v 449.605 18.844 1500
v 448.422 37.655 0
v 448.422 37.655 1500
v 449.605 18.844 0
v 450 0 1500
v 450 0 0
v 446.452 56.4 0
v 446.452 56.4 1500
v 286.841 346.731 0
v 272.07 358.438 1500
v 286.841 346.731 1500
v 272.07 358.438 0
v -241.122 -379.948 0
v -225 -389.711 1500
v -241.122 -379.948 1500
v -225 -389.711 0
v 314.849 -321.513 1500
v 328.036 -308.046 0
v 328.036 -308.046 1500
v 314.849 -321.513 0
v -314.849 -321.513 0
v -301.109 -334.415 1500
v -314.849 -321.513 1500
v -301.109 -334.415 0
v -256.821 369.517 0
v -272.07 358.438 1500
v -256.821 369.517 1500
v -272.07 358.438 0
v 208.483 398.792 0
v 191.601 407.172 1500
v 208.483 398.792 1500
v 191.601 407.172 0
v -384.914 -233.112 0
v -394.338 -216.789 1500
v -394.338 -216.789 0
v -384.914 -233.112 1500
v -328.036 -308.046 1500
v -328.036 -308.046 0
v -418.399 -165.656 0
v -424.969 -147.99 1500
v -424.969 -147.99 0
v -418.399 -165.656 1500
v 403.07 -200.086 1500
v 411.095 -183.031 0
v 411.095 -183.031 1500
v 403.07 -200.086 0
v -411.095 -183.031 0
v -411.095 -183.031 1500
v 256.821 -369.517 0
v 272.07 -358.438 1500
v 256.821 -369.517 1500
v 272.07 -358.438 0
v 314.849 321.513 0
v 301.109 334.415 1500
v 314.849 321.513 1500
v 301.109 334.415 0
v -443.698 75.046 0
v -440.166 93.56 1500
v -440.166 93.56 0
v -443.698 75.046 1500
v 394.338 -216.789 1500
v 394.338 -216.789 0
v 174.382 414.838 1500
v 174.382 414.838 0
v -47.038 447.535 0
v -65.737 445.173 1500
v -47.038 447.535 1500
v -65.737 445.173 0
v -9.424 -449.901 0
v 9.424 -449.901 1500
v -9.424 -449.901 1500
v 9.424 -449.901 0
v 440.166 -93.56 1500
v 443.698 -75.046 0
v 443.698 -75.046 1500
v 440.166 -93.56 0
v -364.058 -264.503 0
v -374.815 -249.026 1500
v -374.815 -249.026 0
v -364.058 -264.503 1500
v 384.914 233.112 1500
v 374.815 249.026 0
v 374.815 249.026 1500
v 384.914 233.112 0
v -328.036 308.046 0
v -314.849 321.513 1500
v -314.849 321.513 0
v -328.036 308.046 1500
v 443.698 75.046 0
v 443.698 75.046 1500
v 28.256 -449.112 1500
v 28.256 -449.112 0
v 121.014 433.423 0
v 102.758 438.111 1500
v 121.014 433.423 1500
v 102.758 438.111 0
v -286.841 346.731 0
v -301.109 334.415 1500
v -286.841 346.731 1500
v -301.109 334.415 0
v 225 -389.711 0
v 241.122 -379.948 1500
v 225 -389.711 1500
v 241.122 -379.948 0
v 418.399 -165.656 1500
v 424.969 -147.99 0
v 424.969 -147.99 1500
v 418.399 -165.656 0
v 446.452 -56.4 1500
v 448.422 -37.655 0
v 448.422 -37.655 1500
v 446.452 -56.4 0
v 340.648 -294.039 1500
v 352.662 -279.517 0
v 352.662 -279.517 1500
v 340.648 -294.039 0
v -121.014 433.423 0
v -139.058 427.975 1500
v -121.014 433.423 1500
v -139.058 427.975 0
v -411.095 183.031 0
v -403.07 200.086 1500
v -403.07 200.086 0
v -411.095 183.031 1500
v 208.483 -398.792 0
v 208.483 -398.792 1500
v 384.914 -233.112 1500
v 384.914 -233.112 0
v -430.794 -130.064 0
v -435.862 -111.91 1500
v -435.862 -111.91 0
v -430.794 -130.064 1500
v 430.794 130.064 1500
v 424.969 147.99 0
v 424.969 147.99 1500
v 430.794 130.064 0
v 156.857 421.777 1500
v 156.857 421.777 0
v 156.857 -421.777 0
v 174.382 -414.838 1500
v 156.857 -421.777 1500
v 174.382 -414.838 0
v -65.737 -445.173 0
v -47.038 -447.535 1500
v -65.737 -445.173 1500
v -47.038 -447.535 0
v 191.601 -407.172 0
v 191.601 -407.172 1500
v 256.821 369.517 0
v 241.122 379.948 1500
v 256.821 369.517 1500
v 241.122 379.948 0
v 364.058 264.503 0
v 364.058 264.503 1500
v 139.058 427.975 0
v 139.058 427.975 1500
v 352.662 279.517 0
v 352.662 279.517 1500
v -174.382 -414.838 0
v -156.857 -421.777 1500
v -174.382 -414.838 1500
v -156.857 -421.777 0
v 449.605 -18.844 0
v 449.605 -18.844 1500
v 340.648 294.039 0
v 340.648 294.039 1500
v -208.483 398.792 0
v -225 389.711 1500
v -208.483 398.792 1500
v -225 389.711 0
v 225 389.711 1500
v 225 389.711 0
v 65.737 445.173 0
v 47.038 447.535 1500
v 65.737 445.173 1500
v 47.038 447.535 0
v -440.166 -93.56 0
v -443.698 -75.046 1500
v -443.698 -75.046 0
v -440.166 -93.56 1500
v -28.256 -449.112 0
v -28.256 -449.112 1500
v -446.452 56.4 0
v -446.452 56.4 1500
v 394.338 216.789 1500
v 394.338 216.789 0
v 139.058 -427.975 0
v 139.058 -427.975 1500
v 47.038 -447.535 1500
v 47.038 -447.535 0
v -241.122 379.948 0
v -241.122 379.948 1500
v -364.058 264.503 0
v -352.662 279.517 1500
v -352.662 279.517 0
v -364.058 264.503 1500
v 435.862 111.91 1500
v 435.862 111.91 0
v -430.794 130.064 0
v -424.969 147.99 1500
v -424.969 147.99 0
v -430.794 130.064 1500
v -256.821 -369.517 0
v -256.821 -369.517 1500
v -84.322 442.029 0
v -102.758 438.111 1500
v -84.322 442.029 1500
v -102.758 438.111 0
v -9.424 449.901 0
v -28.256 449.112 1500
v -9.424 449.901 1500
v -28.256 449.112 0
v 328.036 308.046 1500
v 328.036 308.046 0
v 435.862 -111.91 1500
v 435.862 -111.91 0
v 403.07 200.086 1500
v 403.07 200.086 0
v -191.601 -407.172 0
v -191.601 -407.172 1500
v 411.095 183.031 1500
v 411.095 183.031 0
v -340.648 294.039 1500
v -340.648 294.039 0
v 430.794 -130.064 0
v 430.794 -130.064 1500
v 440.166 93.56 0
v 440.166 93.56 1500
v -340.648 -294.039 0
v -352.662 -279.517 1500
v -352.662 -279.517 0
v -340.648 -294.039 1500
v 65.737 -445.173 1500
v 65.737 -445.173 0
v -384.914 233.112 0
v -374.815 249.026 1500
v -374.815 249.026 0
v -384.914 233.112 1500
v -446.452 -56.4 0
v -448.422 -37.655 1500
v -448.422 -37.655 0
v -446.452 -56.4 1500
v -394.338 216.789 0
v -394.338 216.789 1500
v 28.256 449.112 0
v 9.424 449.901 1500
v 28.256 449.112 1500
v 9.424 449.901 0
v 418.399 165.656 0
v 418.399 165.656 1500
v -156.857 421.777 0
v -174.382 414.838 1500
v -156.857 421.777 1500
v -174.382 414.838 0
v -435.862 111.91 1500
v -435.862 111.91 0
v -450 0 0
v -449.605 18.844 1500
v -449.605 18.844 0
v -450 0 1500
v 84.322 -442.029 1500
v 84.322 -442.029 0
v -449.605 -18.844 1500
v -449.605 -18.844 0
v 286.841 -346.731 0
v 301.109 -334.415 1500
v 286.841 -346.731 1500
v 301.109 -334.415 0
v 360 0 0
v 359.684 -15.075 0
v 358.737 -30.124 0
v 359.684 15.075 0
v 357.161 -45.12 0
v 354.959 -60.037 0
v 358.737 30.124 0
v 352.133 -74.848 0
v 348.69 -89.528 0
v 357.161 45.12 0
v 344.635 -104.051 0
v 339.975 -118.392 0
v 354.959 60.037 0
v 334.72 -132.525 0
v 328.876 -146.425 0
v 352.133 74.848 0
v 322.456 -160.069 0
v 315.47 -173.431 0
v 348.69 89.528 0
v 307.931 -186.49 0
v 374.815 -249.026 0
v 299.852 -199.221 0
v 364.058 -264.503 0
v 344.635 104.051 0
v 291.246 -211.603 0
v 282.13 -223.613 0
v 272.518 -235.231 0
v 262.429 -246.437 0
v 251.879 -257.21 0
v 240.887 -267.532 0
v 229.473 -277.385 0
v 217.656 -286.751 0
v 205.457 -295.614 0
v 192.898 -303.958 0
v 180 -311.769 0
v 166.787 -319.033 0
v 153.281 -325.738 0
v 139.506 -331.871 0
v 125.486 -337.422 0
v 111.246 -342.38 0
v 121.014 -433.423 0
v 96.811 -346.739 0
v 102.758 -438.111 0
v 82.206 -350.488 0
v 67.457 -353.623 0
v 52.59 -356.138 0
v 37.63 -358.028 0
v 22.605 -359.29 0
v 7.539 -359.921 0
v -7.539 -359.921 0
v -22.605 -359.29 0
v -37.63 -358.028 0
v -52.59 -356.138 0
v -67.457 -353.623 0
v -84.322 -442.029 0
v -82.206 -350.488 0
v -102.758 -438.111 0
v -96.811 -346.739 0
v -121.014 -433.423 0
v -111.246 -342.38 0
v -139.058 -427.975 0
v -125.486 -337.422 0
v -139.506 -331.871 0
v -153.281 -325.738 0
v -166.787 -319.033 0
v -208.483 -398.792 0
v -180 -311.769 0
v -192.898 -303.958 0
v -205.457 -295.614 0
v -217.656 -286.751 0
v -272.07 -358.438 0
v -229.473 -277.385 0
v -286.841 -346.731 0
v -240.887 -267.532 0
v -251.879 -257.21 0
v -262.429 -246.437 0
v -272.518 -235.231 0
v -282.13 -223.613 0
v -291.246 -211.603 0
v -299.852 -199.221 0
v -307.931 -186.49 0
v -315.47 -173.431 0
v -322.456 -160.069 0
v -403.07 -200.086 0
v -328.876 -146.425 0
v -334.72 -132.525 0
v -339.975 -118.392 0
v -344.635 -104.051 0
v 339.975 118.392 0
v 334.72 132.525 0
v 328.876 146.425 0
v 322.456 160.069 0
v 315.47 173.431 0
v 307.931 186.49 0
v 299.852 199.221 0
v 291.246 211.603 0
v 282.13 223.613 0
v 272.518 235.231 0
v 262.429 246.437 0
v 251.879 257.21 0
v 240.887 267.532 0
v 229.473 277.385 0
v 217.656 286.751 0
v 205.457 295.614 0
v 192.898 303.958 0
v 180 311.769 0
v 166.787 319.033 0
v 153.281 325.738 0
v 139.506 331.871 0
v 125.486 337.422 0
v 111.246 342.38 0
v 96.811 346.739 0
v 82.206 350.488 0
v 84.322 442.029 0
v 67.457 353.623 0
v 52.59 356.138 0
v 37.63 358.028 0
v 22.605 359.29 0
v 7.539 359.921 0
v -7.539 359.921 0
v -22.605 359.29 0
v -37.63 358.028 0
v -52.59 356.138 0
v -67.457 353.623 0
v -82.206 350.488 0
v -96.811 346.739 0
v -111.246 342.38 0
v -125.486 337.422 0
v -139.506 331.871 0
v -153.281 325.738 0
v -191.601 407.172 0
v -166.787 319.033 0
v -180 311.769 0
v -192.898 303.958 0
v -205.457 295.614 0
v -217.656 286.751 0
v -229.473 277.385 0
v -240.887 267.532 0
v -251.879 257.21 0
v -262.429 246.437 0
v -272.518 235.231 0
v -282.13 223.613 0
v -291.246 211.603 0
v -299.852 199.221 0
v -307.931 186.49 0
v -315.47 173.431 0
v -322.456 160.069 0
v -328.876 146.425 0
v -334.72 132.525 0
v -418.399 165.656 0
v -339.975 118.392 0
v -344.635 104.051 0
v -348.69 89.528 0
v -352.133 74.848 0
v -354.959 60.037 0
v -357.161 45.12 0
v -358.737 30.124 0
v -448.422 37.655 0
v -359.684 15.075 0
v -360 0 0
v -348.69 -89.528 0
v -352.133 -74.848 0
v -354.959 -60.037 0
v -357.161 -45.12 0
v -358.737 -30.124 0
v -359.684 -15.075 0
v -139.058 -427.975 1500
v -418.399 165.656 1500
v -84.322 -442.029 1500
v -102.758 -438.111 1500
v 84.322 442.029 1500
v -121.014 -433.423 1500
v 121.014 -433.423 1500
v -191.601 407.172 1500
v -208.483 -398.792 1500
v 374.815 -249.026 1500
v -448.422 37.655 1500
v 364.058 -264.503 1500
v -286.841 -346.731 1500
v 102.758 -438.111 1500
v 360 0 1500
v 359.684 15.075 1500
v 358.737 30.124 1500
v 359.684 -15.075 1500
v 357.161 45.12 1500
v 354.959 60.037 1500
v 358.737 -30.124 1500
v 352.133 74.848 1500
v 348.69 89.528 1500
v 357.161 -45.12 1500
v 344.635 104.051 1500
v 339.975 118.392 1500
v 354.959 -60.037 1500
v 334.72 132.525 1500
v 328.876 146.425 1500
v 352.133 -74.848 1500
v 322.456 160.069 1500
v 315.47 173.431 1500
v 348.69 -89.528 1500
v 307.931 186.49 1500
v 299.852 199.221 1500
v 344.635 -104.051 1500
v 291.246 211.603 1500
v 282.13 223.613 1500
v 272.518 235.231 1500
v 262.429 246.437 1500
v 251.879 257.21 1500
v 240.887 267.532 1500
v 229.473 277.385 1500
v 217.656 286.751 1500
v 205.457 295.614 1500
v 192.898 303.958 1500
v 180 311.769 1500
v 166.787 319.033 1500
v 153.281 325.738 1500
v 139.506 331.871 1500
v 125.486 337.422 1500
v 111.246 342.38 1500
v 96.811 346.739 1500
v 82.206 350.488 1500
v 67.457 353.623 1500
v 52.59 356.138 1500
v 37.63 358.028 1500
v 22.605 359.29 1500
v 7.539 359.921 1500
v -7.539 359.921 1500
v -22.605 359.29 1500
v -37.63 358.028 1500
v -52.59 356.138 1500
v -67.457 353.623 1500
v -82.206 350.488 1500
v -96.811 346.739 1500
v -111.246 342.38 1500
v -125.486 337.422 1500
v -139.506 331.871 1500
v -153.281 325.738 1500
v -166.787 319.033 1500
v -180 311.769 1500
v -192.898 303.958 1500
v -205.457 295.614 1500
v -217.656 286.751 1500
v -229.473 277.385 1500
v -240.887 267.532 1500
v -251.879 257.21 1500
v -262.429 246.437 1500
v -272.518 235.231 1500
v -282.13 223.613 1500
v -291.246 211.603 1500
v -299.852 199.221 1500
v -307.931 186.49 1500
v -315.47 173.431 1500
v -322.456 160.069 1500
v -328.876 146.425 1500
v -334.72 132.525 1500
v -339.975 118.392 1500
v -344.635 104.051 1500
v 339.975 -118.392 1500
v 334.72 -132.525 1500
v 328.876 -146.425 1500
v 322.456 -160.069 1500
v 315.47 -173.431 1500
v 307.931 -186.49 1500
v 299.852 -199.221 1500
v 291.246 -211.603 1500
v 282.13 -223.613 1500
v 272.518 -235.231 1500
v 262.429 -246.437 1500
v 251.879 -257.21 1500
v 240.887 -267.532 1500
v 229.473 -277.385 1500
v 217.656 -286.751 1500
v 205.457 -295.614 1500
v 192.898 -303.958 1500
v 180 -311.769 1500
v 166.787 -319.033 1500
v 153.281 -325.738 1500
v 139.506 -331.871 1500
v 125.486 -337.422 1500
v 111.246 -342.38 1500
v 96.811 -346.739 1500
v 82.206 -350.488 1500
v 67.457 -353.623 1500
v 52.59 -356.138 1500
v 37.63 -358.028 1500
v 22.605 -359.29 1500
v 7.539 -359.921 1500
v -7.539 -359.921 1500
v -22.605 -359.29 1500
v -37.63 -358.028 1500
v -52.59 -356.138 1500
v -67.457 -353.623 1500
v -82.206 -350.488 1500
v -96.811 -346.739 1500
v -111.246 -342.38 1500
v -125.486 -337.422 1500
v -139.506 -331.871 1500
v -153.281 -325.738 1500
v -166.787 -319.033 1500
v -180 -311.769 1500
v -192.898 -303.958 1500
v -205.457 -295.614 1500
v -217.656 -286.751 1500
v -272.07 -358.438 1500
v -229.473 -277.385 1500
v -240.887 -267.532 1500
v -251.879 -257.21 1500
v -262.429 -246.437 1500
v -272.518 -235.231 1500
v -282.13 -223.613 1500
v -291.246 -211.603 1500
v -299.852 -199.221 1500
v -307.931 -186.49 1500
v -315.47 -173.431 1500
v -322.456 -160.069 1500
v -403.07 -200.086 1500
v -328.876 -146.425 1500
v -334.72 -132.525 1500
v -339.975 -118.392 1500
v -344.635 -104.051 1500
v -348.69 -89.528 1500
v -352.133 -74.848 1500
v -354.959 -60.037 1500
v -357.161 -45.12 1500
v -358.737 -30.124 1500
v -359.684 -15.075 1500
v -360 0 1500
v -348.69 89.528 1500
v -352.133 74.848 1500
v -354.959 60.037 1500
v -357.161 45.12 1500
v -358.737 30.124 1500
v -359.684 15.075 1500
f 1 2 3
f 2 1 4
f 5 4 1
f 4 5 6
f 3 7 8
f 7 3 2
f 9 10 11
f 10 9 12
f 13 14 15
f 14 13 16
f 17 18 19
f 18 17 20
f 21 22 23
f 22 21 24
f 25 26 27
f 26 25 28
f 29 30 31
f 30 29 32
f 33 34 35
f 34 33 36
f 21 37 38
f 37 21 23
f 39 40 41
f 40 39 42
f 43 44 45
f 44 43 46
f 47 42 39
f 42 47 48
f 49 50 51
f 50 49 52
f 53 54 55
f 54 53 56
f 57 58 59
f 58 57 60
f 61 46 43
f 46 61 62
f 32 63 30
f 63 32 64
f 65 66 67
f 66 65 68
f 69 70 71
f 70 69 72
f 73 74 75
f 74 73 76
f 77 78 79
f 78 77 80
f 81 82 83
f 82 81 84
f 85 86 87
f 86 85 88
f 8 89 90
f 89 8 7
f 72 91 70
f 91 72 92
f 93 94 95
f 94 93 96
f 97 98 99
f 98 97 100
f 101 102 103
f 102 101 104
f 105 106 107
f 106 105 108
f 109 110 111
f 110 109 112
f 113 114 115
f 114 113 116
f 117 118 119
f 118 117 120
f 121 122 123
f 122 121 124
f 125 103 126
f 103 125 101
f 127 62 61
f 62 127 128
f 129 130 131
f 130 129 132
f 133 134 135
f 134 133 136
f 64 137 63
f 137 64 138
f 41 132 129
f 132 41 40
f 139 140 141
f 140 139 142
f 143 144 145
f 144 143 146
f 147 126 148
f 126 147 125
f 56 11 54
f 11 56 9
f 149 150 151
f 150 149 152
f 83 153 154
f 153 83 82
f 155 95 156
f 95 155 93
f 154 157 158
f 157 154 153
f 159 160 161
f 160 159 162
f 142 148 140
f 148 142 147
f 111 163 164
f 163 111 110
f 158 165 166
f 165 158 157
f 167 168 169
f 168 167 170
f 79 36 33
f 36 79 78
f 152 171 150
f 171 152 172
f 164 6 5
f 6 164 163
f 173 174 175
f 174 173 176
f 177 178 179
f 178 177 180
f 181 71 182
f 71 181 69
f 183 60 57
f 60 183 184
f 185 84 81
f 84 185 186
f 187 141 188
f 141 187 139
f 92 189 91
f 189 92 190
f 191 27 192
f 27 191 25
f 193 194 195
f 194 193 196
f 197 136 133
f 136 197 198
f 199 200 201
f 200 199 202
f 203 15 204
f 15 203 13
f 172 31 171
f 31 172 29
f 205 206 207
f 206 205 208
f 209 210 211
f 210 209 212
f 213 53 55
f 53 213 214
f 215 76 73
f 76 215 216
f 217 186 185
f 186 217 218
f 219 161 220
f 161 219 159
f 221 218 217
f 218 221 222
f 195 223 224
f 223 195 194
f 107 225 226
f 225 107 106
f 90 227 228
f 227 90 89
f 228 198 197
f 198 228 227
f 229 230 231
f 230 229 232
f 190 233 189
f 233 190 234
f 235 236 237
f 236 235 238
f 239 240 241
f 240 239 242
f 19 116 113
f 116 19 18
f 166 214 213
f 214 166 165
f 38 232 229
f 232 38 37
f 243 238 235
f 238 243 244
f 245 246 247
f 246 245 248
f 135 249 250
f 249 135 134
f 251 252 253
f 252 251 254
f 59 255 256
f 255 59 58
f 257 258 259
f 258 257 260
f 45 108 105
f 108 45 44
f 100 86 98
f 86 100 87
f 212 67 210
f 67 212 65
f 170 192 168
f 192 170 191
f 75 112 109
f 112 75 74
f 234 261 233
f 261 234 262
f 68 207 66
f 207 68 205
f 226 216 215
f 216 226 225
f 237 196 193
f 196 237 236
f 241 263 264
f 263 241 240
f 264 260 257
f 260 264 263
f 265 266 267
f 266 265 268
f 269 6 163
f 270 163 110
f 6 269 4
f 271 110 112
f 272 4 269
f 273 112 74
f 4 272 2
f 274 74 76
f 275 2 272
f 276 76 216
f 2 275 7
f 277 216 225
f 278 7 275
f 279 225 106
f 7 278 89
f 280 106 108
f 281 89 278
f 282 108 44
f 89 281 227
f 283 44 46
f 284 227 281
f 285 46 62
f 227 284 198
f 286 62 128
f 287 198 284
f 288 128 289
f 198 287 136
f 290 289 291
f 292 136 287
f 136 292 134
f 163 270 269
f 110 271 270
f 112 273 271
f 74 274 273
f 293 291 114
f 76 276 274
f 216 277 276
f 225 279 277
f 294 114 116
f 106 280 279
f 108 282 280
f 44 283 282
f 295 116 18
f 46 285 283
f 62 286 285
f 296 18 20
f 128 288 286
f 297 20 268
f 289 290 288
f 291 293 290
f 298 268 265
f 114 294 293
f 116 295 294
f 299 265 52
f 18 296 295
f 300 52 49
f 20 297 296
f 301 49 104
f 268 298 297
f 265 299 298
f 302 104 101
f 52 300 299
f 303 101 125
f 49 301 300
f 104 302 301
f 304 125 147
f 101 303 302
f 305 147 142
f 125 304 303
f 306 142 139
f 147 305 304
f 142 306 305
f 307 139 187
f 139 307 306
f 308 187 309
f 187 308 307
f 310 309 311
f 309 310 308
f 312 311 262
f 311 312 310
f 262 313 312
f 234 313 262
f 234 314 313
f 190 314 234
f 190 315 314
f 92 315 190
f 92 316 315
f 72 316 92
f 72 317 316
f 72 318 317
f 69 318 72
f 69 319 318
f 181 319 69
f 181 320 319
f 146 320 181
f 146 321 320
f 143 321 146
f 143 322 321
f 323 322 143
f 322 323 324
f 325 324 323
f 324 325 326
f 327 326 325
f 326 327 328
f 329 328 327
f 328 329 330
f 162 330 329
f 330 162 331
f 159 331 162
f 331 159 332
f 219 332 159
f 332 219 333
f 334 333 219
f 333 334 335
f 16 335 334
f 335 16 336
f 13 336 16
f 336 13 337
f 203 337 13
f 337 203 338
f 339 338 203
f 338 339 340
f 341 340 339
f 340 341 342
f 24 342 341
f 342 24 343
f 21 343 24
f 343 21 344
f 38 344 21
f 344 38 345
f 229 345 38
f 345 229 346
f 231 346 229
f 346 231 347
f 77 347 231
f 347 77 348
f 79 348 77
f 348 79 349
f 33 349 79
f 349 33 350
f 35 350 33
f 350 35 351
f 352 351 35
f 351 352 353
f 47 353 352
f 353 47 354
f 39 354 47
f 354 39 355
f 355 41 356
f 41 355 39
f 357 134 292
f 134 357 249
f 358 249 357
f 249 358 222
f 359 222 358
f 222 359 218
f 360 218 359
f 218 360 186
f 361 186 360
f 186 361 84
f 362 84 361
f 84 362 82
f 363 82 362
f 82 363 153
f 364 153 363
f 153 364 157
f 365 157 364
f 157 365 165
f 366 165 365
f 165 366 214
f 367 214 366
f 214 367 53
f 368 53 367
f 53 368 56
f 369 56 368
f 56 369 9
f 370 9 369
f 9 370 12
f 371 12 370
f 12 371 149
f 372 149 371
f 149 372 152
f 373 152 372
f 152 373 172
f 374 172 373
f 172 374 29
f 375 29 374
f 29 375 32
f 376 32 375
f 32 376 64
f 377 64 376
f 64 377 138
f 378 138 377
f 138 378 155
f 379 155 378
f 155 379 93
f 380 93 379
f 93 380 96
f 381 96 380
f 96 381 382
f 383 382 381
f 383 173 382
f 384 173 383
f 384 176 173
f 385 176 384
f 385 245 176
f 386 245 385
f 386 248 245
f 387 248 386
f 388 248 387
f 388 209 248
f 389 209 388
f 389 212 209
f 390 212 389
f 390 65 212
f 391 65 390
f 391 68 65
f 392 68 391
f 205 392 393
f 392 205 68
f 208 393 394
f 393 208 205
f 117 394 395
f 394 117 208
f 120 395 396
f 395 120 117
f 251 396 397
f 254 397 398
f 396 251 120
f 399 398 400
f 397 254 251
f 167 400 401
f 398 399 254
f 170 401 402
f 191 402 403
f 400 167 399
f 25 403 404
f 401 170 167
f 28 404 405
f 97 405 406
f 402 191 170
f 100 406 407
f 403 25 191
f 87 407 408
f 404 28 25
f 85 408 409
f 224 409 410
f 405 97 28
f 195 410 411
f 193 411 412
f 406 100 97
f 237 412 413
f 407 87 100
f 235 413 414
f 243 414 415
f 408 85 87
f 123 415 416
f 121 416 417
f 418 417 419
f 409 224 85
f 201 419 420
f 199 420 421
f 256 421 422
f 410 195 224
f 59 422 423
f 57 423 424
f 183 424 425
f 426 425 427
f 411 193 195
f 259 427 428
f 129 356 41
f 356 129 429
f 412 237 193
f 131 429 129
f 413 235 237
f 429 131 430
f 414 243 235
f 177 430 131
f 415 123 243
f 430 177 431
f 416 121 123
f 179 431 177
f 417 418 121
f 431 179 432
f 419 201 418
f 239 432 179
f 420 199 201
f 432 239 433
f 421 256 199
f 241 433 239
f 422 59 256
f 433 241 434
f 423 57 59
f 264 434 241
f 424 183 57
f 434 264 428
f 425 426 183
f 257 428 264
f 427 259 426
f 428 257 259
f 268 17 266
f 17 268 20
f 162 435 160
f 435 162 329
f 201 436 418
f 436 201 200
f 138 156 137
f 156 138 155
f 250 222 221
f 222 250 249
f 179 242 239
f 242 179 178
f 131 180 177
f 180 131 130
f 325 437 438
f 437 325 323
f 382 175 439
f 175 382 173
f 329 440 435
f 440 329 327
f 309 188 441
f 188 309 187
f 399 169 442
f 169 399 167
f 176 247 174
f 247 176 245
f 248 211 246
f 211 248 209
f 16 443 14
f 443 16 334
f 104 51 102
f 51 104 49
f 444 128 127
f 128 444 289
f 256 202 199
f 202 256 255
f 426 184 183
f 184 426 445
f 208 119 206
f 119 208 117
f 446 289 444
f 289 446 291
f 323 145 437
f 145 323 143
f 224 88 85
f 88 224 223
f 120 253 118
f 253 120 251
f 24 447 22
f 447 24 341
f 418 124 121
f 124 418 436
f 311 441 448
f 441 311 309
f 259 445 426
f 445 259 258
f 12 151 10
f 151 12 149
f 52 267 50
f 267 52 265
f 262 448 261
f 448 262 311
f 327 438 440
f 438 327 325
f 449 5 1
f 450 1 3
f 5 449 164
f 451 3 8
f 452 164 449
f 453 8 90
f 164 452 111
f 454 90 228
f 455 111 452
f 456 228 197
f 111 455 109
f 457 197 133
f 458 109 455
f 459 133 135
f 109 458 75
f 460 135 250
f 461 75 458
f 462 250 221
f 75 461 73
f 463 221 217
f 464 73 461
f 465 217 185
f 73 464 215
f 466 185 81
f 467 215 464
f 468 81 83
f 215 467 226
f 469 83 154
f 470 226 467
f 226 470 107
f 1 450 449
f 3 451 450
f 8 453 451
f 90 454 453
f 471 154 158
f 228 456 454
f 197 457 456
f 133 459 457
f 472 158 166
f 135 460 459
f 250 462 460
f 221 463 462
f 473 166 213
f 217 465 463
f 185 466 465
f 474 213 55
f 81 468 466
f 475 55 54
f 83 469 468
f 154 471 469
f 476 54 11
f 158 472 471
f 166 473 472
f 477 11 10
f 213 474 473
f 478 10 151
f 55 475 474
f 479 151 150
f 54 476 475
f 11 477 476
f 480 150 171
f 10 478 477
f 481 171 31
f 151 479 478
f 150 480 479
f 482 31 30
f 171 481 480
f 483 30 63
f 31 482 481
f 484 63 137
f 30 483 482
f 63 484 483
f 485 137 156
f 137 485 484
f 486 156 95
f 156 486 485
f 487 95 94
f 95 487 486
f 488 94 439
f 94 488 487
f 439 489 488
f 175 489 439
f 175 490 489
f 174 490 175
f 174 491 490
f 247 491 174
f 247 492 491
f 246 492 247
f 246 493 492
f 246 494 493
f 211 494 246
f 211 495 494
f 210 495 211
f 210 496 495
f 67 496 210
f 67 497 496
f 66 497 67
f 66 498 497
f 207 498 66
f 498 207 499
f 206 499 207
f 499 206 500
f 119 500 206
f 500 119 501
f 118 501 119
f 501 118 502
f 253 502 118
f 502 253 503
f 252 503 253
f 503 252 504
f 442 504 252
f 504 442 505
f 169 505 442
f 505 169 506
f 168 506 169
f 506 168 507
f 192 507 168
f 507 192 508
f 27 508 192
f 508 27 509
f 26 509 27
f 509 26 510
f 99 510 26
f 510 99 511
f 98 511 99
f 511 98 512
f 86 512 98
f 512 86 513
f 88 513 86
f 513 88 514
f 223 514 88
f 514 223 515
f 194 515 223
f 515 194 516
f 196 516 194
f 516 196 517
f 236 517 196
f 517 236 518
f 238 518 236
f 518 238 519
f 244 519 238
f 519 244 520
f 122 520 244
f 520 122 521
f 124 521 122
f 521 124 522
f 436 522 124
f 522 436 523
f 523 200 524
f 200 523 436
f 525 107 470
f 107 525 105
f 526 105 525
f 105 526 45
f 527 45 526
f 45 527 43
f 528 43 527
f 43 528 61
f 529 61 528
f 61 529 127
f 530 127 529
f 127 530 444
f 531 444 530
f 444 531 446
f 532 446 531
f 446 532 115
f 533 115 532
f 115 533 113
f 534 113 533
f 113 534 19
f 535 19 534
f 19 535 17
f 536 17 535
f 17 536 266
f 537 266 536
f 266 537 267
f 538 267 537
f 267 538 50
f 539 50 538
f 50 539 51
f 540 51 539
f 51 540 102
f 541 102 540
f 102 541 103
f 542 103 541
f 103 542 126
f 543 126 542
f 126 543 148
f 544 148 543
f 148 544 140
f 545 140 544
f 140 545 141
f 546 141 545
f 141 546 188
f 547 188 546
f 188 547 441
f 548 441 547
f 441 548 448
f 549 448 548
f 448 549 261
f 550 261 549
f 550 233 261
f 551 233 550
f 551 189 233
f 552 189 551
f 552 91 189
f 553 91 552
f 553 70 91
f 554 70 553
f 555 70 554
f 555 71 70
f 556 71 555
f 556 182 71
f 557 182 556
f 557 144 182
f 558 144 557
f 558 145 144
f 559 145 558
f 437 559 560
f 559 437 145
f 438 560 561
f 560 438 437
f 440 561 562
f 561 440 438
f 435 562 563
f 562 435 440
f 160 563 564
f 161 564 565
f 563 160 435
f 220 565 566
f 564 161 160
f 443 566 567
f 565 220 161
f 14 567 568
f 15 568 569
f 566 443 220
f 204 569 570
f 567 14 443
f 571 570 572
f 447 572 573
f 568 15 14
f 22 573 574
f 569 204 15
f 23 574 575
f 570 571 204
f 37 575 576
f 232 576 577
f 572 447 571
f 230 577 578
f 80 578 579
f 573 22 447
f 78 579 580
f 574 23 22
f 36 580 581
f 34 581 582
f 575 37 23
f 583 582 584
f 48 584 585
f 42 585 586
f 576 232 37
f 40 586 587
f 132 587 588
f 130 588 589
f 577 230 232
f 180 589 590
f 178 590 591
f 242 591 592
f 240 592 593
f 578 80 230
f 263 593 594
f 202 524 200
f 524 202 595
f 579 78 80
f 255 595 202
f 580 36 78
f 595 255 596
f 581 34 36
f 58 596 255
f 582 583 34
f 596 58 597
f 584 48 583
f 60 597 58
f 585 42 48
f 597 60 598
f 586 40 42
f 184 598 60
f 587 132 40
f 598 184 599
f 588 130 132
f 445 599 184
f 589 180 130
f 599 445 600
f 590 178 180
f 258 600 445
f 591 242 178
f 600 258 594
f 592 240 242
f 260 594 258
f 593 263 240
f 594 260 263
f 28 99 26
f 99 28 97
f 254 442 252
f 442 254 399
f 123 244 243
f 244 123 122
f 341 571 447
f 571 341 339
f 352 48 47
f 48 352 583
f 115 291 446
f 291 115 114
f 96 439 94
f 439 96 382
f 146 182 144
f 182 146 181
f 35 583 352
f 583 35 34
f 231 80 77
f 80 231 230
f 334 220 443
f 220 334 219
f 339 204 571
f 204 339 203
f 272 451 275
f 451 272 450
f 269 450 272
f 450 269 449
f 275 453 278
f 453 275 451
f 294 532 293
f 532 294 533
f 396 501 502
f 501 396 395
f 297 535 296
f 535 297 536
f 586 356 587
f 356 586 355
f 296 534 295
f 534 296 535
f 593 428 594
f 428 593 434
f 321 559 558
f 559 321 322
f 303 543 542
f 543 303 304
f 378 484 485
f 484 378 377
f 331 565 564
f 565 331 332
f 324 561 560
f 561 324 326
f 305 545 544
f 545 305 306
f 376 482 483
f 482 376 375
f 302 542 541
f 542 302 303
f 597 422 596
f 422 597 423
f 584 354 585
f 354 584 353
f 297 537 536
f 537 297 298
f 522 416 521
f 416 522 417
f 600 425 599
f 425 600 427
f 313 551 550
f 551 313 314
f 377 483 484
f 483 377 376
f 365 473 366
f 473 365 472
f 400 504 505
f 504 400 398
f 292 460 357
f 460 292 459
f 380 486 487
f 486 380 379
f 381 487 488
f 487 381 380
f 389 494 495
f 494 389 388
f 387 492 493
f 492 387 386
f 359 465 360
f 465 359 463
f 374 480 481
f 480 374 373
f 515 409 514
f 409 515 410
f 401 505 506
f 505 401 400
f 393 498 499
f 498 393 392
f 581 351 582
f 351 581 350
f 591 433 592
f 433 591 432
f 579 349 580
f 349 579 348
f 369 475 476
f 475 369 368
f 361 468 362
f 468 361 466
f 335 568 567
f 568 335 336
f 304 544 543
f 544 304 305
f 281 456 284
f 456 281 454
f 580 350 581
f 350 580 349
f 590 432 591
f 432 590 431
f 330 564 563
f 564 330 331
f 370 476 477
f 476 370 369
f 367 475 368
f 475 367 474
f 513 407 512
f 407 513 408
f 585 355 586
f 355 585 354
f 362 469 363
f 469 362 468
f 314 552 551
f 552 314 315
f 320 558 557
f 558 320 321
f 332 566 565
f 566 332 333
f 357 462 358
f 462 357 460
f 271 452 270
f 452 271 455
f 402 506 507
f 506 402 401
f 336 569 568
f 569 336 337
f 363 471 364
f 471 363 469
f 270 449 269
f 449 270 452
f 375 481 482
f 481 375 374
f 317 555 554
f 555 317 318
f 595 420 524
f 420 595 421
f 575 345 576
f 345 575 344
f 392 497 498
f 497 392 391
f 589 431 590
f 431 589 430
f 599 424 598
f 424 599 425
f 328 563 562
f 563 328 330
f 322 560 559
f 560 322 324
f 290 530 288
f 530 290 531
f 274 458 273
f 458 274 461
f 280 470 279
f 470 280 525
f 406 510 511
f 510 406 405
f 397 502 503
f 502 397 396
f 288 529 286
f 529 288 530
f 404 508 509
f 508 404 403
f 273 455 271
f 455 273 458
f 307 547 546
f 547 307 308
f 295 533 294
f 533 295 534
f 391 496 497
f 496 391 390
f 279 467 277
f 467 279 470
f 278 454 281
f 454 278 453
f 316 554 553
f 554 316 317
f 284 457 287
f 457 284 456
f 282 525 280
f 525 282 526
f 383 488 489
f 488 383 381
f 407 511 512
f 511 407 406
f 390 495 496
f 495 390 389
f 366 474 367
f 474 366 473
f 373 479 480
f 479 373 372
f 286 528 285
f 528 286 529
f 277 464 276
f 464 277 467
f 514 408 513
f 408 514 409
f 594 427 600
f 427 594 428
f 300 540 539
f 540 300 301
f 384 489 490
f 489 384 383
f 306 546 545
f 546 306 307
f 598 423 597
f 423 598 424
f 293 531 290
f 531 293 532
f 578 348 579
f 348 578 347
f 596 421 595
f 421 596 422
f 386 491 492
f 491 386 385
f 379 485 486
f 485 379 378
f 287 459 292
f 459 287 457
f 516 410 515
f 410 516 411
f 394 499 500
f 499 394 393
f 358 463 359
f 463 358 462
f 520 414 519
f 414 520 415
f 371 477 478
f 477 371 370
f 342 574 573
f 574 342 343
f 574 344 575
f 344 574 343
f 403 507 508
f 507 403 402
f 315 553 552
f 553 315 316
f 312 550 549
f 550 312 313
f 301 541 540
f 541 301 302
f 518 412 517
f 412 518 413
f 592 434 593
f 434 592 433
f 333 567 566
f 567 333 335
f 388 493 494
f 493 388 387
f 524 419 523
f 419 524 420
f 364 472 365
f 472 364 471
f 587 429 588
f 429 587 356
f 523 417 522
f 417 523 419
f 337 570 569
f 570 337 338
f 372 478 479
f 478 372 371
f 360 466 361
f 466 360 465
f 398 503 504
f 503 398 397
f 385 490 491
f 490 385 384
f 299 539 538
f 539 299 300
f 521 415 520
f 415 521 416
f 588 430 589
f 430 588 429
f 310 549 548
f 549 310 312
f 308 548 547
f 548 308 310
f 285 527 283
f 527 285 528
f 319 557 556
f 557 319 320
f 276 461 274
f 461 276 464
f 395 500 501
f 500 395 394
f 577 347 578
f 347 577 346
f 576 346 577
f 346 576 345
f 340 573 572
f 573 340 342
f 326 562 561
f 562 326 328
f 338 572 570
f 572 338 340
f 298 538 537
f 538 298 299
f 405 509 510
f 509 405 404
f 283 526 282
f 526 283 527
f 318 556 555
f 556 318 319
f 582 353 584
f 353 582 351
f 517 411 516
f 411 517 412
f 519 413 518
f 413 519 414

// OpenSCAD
// General underground concrete pipe
// Units in millimeters

$fn = 150; // smoothness

pipe_length = 1500;
outer_diameter = 900;
wall_thickness = 90;

// Derived
inner_diameter = outer_diameter - 2 * wall_thickness;

difference() {
    union() {
        // Main cylinder
        cylinder(h = pipe_length, d = outer_diameter, center = false);
    }

    // Hollow out interior
    translate([0, 0, -1])
        cylinder(h = pipe_length + 2, d = inner_diameter, center = false);
}
